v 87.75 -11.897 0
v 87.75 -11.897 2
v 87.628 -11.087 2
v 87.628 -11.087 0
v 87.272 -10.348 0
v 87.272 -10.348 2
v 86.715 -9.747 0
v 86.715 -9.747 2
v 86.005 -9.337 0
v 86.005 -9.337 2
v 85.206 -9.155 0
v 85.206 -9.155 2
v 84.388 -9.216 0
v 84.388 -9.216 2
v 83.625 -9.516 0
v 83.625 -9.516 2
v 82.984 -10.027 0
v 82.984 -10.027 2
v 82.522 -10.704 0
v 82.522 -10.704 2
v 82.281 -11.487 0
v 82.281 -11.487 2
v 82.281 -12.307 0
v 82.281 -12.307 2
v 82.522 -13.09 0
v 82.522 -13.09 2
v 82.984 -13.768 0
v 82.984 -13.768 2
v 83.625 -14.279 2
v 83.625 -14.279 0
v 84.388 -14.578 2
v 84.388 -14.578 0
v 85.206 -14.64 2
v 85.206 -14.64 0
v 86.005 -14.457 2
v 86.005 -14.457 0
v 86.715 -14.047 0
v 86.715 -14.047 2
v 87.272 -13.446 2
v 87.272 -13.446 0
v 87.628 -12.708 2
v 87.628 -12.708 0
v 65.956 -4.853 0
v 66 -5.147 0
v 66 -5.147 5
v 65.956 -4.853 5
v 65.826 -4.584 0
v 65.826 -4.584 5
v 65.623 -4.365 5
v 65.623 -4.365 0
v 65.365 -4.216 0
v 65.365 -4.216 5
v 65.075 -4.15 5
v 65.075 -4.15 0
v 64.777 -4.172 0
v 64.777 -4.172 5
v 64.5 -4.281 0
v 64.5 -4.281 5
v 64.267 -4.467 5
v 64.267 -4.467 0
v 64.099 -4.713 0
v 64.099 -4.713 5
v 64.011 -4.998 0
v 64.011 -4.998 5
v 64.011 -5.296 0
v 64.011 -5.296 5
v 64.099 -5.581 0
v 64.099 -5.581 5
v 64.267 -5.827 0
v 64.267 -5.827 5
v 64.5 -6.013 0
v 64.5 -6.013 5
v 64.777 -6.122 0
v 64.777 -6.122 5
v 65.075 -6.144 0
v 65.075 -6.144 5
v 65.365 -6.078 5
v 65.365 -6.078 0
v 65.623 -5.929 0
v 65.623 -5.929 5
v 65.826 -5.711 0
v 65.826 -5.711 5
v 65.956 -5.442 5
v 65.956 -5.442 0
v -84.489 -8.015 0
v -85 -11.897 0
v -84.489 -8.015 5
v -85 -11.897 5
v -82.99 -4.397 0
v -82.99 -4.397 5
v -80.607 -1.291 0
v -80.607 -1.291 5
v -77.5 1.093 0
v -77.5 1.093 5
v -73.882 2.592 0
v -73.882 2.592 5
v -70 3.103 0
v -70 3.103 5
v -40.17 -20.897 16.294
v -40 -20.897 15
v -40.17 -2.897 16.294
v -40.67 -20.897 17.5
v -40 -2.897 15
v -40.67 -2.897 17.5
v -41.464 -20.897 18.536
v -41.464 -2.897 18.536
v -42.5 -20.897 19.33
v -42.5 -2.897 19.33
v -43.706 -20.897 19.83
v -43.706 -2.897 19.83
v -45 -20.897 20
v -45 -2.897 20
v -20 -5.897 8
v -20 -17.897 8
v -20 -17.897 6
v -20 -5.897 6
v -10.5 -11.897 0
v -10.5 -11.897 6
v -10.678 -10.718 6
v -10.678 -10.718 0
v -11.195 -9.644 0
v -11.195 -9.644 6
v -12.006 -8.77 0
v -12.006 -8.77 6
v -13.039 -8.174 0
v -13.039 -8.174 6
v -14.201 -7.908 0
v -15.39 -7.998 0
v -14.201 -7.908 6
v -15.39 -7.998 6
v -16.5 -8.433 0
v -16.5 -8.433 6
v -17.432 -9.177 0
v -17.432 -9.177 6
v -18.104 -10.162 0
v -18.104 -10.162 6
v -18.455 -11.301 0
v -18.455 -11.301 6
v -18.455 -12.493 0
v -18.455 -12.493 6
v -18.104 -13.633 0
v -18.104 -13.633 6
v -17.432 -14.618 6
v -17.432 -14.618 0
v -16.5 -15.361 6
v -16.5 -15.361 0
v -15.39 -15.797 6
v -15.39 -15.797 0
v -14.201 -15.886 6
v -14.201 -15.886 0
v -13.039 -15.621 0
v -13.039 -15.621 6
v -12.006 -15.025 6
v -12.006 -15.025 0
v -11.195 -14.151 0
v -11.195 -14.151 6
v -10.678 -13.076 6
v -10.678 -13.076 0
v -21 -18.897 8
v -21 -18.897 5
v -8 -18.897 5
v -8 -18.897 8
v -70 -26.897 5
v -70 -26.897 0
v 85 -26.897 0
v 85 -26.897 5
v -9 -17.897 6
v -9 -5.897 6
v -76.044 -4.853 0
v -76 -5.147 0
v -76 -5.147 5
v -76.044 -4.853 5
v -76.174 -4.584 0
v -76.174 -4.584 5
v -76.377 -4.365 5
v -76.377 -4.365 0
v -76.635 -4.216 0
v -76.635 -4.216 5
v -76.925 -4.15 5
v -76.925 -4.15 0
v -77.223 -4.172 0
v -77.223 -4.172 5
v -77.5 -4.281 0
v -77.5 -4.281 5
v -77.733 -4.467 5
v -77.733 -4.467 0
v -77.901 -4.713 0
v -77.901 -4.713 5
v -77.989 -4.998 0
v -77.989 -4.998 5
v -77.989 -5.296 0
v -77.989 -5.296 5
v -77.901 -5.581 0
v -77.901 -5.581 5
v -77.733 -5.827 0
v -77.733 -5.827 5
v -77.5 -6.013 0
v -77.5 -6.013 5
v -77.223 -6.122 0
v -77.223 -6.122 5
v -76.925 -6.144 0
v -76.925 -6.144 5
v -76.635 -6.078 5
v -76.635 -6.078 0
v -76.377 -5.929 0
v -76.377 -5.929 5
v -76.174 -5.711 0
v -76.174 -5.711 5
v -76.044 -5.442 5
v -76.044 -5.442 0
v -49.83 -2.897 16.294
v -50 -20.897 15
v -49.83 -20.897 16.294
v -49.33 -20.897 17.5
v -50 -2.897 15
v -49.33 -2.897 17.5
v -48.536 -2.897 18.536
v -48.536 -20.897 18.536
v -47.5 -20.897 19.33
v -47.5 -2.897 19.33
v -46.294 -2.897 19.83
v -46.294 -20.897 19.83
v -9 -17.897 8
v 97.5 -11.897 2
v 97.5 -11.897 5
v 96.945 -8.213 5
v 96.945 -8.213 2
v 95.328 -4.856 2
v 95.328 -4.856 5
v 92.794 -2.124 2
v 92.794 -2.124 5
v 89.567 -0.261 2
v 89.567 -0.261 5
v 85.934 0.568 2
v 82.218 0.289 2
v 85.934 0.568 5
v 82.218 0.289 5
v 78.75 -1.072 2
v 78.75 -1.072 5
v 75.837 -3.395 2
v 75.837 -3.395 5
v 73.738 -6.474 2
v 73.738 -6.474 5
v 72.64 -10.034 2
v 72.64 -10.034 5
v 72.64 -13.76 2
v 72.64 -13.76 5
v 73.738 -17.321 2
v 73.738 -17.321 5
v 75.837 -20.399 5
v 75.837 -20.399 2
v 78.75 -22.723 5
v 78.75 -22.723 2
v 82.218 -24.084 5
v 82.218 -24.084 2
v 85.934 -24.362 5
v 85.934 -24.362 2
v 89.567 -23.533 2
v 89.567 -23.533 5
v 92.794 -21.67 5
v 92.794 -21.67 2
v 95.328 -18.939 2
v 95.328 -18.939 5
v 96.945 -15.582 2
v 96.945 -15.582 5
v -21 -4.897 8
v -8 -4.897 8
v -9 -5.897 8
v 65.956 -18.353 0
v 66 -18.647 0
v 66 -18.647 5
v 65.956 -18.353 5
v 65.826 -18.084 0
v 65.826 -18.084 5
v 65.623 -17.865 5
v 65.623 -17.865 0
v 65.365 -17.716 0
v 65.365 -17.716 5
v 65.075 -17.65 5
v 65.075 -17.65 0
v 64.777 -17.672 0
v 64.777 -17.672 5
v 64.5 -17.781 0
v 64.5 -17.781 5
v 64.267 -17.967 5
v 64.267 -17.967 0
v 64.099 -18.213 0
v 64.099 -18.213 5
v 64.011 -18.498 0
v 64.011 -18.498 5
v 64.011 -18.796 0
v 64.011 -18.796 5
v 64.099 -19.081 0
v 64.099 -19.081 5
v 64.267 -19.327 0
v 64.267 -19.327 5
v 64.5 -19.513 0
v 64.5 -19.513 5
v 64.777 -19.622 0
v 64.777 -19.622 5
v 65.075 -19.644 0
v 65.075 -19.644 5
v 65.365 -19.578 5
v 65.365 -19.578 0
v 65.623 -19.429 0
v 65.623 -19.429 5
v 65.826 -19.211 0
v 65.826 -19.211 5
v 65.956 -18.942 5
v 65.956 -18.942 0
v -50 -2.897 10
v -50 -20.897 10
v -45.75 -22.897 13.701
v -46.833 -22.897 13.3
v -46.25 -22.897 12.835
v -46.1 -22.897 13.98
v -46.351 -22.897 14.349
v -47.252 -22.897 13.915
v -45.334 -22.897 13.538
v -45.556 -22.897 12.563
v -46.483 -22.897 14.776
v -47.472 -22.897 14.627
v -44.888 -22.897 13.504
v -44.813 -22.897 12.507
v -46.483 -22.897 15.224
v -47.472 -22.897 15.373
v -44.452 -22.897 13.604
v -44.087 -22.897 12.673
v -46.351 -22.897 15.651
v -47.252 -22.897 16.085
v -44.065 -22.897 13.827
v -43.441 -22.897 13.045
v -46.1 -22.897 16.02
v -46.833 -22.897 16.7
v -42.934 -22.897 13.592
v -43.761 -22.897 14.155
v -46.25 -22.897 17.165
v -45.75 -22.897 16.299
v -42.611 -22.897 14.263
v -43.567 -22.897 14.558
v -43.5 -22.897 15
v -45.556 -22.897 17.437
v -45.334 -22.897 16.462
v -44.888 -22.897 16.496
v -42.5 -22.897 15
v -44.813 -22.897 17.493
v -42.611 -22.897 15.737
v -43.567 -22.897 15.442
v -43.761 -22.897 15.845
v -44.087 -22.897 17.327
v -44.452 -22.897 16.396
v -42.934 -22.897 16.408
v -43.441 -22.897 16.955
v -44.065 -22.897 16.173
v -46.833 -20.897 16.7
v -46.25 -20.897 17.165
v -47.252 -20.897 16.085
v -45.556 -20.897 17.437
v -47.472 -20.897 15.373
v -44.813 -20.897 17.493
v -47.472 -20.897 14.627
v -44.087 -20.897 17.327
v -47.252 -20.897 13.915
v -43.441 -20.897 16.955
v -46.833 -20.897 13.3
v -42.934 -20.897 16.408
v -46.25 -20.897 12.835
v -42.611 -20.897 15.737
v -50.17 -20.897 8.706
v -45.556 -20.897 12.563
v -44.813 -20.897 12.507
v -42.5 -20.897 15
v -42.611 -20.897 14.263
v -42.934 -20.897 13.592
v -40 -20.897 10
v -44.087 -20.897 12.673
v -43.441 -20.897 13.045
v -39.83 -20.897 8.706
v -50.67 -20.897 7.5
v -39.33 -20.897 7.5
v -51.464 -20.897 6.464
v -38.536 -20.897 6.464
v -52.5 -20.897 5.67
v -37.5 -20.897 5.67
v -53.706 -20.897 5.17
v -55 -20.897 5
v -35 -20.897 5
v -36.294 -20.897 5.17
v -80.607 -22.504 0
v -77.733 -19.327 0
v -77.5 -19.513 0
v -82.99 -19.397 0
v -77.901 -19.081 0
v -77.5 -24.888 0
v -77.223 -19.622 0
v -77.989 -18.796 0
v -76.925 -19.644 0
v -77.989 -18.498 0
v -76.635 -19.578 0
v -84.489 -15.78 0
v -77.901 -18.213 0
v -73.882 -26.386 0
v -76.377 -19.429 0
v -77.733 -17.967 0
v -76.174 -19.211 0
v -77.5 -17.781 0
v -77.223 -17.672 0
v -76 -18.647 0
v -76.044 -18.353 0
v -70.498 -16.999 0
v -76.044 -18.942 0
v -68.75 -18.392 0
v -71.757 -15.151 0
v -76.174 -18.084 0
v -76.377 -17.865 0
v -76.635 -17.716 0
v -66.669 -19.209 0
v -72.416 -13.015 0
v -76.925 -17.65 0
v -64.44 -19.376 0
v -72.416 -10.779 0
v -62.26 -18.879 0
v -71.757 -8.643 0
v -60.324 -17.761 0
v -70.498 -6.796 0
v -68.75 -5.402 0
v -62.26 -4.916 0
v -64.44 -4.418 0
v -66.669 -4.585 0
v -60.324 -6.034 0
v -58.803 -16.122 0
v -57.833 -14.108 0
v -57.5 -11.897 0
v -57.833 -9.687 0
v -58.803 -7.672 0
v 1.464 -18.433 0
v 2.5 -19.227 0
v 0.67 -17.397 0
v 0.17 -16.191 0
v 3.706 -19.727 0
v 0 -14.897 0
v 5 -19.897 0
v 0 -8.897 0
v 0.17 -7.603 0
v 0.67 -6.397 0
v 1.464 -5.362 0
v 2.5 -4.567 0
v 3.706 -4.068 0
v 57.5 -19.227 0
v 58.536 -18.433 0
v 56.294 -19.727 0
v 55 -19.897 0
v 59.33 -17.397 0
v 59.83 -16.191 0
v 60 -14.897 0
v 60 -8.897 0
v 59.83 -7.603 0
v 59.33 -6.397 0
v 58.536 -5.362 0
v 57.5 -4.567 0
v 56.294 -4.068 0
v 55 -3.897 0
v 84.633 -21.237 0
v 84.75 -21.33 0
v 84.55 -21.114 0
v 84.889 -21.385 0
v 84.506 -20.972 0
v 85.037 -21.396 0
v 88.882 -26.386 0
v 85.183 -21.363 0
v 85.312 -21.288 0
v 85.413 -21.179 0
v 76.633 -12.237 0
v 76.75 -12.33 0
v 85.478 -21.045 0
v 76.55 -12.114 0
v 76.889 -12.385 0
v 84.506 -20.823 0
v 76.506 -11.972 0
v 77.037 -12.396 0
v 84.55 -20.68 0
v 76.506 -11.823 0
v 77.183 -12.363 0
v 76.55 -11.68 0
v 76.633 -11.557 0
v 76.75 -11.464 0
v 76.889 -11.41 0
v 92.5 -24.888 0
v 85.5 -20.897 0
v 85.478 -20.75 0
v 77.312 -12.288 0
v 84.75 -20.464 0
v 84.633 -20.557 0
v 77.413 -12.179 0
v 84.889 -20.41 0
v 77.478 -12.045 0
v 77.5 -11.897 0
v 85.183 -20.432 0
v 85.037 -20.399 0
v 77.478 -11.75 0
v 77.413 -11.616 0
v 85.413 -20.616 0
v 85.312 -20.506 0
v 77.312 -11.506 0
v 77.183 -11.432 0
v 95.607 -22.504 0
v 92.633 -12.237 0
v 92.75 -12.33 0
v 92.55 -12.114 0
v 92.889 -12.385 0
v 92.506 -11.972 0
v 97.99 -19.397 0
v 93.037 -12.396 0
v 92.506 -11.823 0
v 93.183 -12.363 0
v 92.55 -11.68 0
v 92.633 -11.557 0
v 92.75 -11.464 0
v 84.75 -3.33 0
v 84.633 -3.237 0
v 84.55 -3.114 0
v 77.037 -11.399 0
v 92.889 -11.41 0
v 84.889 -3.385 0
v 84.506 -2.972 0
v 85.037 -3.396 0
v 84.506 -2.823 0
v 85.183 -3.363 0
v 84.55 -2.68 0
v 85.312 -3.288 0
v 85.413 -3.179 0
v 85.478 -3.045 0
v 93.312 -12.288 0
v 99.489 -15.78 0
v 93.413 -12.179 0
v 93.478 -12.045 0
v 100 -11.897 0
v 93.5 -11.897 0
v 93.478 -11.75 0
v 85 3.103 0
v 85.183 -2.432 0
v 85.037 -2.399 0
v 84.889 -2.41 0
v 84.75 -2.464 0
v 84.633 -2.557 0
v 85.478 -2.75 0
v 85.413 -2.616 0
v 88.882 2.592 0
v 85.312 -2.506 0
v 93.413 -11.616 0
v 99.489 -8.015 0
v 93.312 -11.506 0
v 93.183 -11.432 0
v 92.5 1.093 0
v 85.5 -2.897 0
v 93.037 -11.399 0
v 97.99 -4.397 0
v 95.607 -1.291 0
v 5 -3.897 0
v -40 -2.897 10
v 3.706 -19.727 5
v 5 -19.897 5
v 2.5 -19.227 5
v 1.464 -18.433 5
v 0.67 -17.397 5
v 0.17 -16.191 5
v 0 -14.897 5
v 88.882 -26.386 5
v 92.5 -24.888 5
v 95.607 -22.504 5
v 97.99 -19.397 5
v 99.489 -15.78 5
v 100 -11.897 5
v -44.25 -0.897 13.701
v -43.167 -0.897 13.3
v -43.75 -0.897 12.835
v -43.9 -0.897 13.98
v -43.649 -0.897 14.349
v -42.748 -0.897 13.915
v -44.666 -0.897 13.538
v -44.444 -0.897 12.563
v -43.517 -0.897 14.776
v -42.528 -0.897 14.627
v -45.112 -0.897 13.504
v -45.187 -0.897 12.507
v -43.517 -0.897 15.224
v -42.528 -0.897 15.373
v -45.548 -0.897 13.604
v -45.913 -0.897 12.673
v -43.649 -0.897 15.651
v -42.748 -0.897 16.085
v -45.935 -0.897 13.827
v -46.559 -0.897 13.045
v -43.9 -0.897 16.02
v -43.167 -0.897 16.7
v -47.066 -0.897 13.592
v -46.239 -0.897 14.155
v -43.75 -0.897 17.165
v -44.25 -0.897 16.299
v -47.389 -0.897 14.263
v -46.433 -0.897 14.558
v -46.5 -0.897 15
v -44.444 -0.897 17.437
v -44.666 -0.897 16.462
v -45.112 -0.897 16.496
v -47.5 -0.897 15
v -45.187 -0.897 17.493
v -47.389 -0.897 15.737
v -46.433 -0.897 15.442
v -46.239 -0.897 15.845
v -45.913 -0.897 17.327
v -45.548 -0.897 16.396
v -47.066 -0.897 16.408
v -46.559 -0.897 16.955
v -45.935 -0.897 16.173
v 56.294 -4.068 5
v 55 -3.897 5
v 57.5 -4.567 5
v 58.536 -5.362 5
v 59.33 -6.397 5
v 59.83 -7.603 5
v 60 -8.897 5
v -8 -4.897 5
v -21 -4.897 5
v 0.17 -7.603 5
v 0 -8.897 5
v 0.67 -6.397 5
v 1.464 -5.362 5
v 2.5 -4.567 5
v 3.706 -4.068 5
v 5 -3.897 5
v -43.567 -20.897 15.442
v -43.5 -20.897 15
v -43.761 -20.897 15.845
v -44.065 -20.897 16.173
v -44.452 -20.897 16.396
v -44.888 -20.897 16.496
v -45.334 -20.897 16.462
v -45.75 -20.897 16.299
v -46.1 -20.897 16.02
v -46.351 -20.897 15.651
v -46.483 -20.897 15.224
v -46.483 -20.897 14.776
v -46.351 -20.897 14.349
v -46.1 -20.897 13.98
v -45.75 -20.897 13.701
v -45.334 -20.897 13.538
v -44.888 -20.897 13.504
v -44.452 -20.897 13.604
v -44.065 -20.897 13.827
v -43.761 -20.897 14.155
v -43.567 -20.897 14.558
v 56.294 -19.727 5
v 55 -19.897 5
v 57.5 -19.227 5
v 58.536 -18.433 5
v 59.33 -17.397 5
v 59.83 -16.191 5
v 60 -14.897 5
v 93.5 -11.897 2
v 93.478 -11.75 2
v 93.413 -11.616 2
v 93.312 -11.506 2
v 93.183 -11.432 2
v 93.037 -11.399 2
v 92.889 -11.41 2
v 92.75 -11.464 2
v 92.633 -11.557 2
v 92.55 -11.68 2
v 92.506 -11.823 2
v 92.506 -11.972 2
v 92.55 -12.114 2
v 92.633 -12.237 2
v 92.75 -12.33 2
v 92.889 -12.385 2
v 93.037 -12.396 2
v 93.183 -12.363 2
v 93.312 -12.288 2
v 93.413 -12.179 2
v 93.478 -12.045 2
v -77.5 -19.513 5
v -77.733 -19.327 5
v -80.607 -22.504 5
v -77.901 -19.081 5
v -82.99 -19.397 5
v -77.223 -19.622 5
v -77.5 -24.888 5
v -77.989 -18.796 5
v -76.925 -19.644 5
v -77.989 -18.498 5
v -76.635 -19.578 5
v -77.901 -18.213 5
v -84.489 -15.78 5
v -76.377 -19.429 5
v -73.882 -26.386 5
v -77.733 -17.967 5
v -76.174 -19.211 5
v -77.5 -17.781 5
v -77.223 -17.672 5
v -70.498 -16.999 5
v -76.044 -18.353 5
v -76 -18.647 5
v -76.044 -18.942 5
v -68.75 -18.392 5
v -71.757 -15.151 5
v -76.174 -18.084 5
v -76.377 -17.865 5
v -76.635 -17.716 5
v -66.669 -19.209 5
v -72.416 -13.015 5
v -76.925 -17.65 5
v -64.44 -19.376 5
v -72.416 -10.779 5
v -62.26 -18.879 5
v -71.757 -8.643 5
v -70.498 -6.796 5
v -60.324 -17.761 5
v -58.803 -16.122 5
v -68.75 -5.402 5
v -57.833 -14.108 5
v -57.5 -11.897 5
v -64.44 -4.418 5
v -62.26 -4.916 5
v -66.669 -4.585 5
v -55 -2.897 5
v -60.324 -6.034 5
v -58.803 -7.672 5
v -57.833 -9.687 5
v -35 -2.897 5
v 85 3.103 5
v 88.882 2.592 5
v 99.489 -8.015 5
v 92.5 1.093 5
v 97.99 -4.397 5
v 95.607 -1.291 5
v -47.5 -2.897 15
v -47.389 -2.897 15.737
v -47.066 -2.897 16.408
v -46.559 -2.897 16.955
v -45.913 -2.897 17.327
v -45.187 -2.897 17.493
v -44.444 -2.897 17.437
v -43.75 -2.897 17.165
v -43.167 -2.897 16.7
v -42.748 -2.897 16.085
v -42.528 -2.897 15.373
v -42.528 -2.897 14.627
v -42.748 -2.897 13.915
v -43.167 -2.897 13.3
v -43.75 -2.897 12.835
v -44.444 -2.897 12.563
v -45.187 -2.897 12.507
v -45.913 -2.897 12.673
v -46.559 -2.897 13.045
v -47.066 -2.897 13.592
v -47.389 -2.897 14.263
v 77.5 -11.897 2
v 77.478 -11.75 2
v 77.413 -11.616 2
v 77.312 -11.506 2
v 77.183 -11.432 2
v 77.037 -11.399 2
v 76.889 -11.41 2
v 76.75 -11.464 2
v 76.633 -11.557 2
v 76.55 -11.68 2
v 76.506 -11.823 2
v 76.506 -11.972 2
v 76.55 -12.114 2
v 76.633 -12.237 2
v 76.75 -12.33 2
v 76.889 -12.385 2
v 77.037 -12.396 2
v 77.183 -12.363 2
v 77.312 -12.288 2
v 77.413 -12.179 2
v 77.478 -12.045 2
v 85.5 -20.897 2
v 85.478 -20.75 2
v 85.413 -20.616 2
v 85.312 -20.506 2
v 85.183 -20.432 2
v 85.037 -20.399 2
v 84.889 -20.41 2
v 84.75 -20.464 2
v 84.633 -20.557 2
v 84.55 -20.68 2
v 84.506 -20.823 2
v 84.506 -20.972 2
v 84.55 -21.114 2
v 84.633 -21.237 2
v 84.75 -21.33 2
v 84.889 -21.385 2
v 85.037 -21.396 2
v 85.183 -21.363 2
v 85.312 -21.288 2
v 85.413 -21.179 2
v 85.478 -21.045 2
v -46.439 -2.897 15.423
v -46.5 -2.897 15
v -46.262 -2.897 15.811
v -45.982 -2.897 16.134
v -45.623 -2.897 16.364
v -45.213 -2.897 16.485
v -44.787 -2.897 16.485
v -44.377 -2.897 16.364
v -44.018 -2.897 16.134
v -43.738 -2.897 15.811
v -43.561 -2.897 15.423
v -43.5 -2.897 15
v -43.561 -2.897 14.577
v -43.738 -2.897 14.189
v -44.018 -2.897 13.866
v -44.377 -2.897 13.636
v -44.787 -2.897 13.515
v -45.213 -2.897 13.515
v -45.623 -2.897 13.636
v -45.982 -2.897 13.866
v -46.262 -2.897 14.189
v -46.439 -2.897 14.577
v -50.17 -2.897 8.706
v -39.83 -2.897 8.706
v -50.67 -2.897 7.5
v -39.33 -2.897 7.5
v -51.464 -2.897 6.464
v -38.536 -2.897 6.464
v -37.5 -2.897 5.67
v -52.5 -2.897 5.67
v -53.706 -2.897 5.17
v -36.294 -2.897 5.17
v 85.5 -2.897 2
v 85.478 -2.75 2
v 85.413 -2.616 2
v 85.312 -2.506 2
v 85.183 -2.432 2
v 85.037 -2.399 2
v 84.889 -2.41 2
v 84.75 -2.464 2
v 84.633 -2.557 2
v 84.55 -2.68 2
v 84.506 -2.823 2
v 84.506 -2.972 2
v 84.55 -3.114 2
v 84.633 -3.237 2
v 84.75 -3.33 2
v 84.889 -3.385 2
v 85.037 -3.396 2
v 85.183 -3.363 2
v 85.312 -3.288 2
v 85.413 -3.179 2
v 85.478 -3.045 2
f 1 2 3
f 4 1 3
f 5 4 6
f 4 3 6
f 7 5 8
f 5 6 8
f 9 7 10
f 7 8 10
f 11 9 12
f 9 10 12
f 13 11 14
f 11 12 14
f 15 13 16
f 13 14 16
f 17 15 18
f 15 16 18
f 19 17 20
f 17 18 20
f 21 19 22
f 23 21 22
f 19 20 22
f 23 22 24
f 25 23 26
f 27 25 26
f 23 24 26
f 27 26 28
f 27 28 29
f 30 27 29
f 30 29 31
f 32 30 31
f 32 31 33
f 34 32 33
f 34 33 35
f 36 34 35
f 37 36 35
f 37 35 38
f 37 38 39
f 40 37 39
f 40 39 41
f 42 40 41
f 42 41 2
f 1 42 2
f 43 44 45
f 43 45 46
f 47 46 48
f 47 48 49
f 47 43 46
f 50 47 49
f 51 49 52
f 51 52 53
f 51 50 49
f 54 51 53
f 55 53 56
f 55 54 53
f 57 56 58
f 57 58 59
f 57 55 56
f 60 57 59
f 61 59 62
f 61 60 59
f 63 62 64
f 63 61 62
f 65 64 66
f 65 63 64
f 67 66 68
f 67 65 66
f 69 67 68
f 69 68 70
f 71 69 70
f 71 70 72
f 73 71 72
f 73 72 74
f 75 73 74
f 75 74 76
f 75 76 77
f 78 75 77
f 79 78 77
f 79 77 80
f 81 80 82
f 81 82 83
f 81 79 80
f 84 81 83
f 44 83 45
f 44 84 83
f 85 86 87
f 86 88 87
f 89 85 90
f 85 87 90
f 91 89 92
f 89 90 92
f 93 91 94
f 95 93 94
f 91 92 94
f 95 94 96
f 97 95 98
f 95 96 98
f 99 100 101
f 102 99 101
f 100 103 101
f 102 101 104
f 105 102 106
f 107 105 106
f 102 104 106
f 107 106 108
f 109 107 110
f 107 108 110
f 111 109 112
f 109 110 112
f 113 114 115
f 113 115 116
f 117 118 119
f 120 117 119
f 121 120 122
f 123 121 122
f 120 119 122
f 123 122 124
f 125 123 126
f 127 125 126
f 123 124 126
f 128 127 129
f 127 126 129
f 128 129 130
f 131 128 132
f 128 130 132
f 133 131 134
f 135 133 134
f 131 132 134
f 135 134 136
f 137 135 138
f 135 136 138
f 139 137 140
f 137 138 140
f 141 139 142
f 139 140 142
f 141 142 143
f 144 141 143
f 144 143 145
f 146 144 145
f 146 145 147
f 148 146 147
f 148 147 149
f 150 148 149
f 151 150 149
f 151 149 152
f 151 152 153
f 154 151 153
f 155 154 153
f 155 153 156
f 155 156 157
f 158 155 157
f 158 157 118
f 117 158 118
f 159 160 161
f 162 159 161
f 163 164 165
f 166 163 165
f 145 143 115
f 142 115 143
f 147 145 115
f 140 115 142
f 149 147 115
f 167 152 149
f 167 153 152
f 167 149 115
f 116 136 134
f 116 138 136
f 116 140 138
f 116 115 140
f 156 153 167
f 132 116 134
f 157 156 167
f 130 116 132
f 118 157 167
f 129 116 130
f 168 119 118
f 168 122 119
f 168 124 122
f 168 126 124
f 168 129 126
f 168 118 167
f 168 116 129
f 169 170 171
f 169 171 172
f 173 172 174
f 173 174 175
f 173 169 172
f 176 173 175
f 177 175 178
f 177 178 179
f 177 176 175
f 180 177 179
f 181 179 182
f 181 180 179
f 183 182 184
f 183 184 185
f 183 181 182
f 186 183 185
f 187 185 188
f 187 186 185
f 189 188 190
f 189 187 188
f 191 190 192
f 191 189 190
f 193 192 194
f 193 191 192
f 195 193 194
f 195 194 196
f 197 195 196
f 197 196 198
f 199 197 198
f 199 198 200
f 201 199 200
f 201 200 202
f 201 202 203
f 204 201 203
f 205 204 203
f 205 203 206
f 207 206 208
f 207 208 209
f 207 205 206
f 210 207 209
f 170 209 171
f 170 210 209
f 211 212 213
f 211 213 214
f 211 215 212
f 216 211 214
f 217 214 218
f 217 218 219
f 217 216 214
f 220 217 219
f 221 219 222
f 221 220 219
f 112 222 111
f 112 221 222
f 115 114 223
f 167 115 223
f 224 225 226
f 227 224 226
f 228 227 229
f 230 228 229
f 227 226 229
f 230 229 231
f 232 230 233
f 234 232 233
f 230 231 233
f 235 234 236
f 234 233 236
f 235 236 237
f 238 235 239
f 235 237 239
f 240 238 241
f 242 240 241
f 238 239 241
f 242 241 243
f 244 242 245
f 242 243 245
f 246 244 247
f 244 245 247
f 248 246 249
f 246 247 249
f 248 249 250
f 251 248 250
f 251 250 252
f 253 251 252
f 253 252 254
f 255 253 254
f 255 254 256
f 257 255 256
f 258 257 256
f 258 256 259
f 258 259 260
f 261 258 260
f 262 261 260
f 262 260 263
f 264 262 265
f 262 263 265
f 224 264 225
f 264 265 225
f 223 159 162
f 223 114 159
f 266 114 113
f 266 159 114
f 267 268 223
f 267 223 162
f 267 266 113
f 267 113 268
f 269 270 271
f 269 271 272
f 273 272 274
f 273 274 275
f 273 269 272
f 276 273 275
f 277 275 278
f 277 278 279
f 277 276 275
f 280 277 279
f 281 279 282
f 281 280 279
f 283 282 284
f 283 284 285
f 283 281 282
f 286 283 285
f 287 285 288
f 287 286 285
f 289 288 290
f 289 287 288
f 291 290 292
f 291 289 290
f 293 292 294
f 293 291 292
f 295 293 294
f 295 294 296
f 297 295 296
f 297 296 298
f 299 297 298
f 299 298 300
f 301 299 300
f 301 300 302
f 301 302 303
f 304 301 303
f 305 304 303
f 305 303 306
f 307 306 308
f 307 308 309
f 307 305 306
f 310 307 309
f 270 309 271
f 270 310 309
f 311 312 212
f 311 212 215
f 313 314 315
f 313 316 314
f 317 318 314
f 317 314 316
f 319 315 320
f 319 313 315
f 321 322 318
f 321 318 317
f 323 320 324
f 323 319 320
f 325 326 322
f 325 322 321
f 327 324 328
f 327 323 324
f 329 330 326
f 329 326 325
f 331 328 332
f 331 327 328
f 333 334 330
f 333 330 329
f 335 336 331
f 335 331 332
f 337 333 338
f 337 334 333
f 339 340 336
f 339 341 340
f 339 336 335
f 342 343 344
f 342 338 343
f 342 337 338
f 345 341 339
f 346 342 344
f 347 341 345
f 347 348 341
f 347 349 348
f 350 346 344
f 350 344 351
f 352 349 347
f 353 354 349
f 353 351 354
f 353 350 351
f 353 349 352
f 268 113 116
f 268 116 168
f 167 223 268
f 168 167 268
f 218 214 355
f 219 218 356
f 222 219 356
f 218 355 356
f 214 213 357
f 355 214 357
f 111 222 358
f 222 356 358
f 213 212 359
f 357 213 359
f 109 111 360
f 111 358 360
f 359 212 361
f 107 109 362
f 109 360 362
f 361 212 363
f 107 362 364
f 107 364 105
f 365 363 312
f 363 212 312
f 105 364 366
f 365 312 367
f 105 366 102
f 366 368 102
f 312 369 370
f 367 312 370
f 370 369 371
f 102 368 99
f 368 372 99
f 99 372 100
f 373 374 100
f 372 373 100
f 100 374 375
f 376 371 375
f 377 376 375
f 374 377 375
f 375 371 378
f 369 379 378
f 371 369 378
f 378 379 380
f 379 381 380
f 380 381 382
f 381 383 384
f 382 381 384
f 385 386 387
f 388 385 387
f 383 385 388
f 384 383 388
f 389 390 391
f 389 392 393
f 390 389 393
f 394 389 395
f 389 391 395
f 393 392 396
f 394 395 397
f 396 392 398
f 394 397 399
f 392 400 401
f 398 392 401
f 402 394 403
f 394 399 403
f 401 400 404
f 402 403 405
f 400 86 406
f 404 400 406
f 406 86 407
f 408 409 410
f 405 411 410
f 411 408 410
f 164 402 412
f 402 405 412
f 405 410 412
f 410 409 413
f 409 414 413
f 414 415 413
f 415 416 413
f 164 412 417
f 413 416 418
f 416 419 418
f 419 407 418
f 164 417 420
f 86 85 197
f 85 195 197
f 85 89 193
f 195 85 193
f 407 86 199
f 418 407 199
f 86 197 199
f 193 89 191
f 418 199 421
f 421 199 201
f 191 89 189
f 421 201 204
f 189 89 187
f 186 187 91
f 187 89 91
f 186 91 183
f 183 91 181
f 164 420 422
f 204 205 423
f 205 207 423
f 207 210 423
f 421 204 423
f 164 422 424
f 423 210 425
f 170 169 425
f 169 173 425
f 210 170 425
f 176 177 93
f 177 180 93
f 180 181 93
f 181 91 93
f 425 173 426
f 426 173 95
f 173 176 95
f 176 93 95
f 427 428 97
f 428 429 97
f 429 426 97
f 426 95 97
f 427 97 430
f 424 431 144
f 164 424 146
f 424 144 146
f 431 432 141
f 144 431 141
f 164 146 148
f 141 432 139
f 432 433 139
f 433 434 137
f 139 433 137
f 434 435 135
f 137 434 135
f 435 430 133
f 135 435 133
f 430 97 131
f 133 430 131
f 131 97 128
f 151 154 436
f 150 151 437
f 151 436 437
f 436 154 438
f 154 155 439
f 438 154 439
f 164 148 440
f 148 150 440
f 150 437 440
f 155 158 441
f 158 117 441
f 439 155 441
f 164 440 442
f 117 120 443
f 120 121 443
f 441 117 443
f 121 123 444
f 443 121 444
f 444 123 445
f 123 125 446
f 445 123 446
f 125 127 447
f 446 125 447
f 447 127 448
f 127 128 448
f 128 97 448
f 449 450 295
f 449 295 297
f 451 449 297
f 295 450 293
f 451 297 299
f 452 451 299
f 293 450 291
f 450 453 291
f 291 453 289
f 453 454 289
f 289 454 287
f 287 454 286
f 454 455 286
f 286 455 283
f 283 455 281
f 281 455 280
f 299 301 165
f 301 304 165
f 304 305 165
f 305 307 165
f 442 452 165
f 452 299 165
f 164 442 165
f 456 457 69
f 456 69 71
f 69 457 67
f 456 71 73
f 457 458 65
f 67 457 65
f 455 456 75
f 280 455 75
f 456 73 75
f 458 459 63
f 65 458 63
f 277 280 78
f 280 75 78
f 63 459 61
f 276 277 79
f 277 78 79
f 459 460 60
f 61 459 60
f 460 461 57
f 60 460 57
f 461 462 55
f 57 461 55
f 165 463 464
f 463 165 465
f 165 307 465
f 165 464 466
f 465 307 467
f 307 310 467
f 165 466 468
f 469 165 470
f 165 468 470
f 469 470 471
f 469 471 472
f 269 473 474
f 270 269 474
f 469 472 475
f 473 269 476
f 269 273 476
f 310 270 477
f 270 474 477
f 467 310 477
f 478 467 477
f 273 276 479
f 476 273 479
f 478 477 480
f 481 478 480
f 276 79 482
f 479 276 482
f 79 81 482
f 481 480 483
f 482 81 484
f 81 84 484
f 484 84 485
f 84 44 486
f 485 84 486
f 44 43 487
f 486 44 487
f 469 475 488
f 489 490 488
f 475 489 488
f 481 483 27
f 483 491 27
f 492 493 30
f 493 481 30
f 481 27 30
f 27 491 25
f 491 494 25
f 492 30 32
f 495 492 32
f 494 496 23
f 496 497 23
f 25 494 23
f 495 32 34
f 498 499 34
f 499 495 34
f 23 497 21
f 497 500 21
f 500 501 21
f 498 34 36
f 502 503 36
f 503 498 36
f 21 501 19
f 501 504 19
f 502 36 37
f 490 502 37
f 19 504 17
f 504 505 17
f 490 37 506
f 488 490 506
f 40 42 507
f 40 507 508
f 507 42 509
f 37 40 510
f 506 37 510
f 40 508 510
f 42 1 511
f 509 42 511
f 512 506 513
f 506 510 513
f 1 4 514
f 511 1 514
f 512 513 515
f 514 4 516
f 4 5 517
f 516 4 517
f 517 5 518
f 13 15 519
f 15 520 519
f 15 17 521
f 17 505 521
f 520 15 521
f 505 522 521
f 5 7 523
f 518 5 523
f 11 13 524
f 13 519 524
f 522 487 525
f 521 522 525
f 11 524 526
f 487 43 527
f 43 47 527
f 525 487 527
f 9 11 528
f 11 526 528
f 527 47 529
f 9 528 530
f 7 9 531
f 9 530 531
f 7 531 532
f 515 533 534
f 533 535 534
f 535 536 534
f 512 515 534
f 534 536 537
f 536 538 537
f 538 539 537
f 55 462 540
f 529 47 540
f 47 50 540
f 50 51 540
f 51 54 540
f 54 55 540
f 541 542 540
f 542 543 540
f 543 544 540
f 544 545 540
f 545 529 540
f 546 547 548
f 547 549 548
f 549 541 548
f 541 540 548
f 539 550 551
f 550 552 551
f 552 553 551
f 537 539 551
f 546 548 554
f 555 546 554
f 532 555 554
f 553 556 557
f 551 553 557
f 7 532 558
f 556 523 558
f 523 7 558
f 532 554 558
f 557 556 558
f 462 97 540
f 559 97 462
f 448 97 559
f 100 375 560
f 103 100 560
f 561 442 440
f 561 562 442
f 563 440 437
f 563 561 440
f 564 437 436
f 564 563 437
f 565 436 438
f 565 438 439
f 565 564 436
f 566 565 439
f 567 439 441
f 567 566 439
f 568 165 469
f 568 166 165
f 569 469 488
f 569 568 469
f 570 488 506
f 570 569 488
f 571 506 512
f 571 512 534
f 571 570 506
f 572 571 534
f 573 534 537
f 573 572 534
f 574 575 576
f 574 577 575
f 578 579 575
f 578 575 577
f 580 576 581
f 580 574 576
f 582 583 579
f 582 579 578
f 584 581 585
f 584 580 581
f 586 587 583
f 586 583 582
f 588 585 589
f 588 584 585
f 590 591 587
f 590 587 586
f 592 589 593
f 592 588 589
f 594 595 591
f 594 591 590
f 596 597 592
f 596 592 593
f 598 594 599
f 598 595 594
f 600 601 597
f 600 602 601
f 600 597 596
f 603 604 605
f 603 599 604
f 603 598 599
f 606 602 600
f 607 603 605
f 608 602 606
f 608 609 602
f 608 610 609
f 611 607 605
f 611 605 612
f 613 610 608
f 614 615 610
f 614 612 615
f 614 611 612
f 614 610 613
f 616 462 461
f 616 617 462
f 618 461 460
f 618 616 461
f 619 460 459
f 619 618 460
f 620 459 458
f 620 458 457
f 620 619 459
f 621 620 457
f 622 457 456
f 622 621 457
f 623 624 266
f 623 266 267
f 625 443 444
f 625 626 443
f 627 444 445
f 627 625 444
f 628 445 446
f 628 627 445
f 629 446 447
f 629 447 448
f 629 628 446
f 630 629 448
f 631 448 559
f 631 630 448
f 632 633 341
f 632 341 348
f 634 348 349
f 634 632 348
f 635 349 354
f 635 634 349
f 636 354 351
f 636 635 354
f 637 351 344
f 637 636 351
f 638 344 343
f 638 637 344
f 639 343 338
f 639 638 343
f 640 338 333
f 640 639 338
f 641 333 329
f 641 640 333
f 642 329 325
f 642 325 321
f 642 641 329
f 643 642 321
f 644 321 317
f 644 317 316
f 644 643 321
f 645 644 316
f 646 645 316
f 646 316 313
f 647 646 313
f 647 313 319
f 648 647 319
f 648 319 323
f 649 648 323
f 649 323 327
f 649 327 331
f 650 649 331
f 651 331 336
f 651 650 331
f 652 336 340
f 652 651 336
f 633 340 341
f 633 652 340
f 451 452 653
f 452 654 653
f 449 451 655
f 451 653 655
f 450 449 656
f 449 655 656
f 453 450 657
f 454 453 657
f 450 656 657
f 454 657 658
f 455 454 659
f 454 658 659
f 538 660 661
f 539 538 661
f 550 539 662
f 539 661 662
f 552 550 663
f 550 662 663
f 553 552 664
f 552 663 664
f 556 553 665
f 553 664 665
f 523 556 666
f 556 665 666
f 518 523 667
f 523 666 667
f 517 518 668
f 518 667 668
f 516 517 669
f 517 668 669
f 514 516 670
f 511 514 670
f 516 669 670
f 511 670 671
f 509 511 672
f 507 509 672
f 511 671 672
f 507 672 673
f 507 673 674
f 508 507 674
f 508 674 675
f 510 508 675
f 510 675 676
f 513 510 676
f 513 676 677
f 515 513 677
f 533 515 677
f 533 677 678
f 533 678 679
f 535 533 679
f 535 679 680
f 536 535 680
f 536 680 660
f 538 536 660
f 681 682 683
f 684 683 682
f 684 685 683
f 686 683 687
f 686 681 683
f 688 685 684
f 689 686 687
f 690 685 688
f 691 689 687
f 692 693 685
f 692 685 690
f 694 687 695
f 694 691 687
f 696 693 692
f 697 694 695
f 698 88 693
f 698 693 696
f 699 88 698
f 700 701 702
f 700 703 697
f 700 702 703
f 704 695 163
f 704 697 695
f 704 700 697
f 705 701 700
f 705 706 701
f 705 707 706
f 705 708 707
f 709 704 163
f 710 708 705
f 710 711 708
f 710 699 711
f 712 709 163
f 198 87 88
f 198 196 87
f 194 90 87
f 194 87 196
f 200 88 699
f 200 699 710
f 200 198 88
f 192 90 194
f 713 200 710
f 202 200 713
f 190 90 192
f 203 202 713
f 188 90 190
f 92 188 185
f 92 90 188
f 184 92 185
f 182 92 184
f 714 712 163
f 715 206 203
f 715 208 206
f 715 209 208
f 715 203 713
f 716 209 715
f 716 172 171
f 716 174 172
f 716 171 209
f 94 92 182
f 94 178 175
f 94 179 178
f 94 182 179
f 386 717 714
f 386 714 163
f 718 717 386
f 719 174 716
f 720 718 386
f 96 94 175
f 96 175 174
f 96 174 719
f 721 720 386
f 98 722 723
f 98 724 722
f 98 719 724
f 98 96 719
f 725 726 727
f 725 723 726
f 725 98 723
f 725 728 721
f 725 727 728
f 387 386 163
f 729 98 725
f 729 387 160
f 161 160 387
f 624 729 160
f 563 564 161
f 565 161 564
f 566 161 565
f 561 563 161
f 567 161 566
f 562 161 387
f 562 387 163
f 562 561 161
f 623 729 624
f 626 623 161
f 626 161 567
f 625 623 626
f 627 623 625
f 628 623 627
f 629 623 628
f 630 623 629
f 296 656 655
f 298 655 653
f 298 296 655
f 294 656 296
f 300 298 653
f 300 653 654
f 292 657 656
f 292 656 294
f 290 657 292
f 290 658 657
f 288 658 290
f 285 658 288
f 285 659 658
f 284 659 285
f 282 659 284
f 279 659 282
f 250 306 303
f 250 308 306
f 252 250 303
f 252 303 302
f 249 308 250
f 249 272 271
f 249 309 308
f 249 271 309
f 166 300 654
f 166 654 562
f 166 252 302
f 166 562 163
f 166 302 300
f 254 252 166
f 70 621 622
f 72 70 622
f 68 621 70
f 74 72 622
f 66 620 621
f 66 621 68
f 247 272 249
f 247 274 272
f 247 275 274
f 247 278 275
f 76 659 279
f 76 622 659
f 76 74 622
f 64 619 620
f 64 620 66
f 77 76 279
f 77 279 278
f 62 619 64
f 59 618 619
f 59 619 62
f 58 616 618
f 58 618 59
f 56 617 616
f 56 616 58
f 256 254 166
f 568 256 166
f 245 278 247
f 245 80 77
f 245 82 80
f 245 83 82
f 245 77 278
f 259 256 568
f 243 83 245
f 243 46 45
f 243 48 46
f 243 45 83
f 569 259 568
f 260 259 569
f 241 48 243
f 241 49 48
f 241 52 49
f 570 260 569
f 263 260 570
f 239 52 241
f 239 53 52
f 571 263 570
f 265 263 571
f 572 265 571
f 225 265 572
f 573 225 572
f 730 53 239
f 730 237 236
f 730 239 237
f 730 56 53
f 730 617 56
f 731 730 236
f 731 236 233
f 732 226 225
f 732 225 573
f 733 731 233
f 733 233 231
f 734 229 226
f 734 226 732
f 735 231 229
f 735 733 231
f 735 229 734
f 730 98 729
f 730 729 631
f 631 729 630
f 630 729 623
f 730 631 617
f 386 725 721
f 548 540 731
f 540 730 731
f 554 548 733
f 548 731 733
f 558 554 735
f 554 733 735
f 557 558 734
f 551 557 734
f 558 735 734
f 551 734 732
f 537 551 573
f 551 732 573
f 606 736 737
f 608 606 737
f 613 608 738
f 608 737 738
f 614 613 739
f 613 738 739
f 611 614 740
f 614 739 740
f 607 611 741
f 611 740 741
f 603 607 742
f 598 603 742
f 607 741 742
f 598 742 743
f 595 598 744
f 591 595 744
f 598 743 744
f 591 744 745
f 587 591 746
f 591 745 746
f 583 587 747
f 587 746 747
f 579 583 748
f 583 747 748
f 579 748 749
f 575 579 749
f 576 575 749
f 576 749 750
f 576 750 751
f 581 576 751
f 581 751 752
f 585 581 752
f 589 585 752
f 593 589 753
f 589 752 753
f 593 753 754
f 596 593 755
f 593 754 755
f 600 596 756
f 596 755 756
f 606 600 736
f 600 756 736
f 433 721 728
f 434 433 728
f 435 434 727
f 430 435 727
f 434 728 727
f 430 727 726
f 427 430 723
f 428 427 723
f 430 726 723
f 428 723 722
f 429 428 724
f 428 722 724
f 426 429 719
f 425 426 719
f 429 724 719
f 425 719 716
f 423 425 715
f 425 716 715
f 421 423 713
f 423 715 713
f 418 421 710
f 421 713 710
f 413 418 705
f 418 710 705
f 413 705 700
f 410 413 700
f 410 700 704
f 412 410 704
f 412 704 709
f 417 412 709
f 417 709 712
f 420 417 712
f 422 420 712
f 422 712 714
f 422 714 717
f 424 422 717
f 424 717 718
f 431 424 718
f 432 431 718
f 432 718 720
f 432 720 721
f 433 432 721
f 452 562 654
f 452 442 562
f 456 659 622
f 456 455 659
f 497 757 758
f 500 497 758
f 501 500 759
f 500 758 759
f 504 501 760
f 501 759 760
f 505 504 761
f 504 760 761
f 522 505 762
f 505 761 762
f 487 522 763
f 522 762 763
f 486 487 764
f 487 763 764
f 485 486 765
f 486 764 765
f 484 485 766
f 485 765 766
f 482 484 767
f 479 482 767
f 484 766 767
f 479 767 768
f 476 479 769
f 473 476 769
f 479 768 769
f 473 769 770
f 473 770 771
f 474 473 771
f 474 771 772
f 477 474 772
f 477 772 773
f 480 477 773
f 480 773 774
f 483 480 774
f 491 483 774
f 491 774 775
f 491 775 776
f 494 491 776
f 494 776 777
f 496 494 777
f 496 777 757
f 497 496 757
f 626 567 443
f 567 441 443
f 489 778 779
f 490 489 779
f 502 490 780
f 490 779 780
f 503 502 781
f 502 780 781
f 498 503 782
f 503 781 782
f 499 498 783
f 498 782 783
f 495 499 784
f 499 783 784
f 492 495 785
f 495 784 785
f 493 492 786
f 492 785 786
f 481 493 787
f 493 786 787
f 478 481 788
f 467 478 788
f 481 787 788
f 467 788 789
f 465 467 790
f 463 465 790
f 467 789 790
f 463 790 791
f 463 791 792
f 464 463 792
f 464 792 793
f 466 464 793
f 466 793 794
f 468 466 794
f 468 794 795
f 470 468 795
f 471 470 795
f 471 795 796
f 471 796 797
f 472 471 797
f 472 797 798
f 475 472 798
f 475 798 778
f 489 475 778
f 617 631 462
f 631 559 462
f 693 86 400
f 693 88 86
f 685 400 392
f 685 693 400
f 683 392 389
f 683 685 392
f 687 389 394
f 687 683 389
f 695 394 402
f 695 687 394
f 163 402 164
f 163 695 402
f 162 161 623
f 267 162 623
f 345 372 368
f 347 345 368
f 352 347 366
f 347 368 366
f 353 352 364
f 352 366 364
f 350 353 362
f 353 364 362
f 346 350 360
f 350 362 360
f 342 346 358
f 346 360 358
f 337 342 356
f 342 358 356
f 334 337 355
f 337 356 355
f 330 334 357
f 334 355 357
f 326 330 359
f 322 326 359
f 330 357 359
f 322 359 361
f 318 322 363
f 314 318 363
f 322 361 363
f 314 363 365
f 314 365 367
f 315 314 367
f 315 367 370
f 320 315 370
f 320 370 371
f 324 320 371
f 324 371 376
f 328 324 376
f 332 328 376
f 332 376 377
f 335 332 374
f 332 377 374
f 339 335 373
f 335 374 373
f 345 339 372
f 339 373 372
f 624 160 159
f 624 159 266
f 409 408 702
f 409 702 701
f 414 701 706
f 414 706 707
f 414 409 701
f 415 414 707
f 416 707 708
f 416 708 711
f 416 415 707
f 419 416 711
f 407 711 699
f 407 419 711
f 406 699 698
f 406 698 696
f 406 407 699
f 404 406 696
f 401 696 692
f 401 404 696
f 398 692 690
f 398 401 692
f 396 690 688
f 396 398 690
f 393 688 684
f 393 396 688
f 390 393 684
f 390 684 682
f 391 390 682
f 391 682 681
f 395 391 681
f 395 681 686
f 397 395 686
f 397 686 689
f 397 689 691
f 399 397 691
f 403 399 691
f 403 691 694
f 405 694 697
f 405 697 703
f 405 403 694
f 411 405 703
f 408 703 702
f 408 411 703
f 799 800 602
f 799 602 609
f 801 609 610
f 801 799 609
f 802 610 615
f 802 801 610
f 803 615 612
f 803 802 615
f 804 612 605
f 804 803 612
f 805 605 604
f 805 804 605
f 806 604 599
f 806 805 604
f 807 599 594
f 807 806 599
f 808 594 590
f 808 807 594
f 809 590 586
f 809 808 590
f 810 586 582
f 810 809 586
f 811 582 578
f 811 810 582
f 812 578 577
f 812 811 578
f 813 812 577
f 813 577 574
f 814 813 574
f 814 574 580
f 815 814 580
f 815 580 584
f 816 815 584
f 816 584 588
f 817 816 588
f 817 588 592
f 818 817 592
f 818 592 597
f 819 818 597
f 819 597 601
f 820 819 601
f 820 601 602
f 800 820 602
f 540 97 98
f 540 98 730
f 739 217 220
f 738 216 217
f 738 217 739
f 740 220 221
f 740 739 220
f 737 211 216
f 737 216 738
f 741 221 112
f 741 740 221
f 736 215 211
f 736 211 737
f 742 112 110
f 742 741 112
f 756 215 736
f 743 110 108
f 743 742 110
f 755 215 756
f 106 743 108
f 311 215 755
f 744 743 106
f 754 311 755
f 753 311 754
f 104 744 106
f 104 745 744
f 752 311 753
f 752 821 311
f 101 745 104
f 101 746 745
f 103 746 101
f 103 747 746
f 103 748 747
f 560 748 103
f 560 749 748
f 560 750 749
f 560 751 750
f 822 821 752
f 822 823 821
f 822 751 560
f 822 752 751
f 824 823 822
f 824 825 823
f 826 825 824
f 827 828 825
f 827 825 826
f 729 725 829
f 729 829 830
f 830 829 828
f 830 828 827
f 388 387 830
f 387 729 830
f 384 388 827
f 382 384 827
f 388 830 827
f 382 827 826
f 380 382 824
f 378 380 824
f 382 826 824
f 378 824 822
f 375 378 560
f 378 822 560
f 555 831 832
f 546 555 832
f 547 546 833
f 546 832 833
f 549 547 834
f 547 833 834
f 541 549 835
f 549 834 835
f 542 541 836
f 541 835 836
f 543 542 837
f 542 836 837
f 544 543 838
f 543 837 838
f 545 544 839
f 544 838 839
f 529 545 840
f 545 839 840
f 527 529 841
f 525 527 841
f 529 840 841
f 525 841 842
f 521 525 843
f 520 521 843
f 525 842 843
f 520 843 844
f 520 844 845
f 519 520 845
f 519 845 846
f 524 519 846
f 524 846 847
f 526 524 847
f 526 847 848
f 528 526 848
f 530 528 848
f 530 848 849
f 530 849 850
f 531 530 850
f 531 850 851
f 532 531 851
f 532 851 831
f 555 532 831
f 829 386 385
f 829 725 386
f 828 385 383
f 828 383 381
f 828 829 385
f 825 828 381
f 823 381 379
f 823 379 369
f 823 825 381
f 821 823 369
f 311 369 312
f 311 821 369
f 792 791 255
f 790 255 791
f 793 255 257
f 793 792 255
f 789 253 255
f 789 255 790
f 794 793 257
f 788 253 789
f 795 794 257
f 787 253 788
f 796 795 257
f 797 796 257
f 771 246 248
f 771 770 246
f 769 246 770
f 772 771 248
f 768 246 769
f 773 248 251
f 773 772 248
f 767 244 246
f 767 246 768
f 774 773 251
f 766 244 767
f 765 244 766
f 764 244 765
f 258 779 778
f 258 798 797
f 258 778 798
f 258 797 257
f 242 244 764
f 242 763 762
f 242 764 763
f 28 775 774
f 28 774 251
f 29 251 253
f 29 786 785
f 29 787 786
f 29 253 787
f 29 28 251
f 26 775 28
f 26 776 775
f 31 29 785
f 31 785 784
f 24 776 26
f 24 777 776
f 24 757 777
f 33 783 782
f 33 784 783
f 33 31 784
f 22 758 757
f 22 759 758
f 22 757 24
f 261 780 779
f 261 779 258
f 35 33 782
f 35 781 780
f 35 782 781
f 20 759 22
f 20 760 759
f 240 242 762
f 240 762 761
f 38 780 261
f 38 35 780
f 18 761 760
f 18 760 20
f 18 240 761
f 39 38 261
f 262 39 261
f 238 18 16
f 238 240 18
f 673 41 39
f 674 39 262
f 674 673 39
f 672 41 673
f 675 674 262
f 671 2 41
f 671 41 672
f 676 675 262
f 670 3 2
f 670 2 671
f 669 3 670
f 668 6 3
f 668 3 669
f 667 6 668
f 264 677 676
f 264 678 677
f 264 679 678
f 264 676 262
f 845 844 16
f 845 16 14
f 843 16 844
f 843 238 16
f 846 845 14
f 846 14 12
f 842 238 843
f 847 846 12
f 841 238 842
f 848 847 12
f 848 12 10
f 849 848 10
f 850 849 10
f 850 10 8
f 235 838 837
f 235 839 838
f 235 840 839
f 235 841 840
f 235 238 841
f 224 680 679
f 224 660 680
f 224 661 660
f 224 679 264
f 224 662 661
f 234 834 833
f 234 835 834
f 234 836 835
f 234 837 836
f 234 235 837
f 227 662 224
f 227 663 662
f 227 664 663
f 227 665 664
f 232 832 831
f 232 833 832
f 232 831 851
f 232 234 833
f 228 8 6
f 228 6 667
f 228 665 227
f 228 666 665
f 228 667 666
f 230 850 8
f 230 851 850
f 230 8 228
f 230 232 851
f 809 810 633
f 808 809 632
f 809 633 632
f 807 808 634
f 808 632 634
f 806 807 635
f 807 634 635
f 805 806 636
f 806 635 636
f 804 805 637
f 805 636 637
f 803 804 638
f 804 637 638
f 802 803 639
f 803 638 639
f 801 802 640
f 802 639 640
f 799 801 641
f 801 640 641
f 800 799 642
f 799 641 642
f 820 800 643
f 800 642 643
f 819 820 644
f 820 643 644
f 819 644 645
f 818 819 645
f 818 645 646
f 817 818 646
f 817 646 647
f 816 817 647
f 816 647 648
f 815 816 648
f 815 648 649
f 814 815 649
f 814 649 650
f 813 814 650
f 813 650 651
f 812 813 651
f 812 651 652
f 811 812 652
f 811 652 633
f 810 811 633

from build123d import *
from build123d import SkipClean  # not in build123d's __all__

# Parameters (mm, degrees)
F0_W      = 185
F0_H      = 30
F0_R      = 1
F0_W_2    = 60
F0_H_2    = 16
F1_DEPTH  = 5
F2_R      = 12.5
F2_R_2    = 0.5
F2_R_3    = 2.75
F3_DEPTH  = 3
F4_DEPTH  = 25
F5_R      = 14.99999
F2_R_4    = 7.5
F6_DEPTH  = 25
F2_W      = 10
F2_H      = 18
F7_DEPTH  = 15
F8_R      = 4.99999
F9_R      = 1.5
F10_DEPTH = 25
F9_R_2    = 2.5
F11_DEPTH = 2
F12_R     = 2.5
F12_R_2   = 1.5
F13_DEPTH = 2
F2_W_2    = 13
F2_H_2    = 14
F14_DEPTH = 3
F15_W     = 11
F15_H     = 12
F15_R     = 4
F16_DEPTH = 2
F17_DEPTH = 25
F18_R     = 5


# Not quite as in the source:
# - a fillet or chamfer is up to 0.001 mm smaller than in the source, because OpenCascade refuses the exact size
# - after a boolean that leaves OpenCascade's solid faulty, fix() repairs it


with BuildPart() as f1:
    # F0 (on Top) → F1 (new body)
    with BuildSketch(Plane.XY):
        with Locations((7.5, -11.8972941886)):
            Rectangle(F0_W, F0_H)
        with Locations((-77, -18.6472941886)):
            Circle(F0_R, mode=Mode.SUBTRACT)
        with Locations((30, -11.8972941886)):
            Rectangle(F0_W_2, F0_H_2, mode=Mode.SUBTRACT)
        with Locations((65, -18.6472941886)):
            Circle(F0_R, mode=Mode.SUBTRACT)
        with Locations((-77, -5.1472941886)):
            Circle(F0_R, mode=Mode.SUBTRACT)
        with Locations((65, -5.1472941886)):
            Circle(F0_R, mode=Mode.SUBTRACT)
    extrude(amount=F1_DEPTH)

    # F2 (on face) → F3 (cut)
    with BuildSketch(Plane.XY.offset(5)):
        with Locations((85, -11.8972941886)):
            Circle(F2_R)
        with Locations((85, -20.8972941886)):
            Circle(F2_R_2, mode=Mode.SUBTRACT)
        with Locations((85, -11.8972941886)):
            Circle(F2_R_3, mode=Mode.SUBTRACT)
        with Locations((77, -11.8972941886)):
            Circle(F2_R_2, mode=Mode.SUBTRACT)
        with Locations((93, -11.8972941886)):
            Circle(F2_R_2, mode=Mode.SUBTRACT)
        with Locations((85, -2.8972941886)):
            Circle(F2_R_2, mode=Mode.SUBTRACT)
    extrude(amount=-F3_DEPTH, mode=Mode.SUBTRACT)

    # F2 (on face) → F4 (cut)
    with BuildSketch(Plane.XY.offset(5)):
        with Locations((85, -11.8972941886)):
            Circle(F2_R_3)
        with Locations((85, -2.8972941886)):
            Circle(F2_R_2)
        with Locations((77, -11.8972941886)):
            Circle(F2_R_2)
        with Locations((85, -20.8972941886)):
            Circle(F2_R_2)
        with Locations((93, -11.8972941886)):
            Circle(F2_R_2)
    extrude(amount=-F4_DEPTH, mode=Mode.SUBTRACT)

    # F5 (radius 15 in the source; OpenCascade refuses exactly that, so slightly less here)
    f5_edges = [f1.edges().sort_by_distance(p)[0] for p in [
        (100, 3.102706, 2.5),
        (100, -26.897294, 2.5),
        (-85, -26.897294, 2.5),
        (-85, 3.102706, 2.5),
    ]]
    fillet(f5_edges, radius=F5_R)

    # F2 (on face) → F6 (cut)
    with BuildSketch(Plane.XY.offset(5)):
        with Locations((-65, -11.8972941886)):
            Circle(F2_R_4)
    extrude(amount=-F6_DEPTH, mode=Mode.SUBTRACT)

    # F2 (on face) → F7 (join)
    with BuildSketch(Plane.XY.offset(5)):
        with Locations((-45, -11.8972941886)):
            Rectangle(F2_W, F2_H)
    extrude(amount=F7_DEPTH)

    # F8 (radius 5 in the source; OpenCascade refuses exactly that, so slightly less here)
    f8_edges = [f1.edges().sort_by_distance(p)[0] for p in [
        (-50, -11.897294, 5),
        (-40, -11.897294, 20),
        (-50, -11.897294, 20),
        (-40, -11.897294, 5),
    ]]
    fillet(f8_edges, radius=F8_R)

    # F9 (on face) → F10 (cut)
    with BuildSketch(Plane.XZ.offset(20.8972941886)):
        with Locations((-45, 15)):
            Circle(F9_R)
    extrude(amount=-F10_DEPTH, mode=Mode.SUBTRACT)

    # F9 (on face) → F11 (join)
    with BuildSketch(Plane.XZ.offset(20.8972941886)):
        with Locations((-45, 15)):
            Circle(F9_R_2)
        with Locations((-45, 15)):
            Circle(F9_R, mode=Mode.SUBTRACT)
    extrude(amount=F11_DEPTH)

    # F12 (on face) → F13 (join)
    with BuildSketch(Plane(origin=(0, -2.8972941886, 0), x_dir=(-1, 0, 0), z_dir=(0, 1, 0))):
        with Locations((45, 15)):
            Circle(F12_R)
        with Locations((45, 15)):
            Circle(F12_R_2, mode=Mode.SUBTRACT)
    with SkipClean():  # cleaning this boolean's faces spoils the solid; the shape is the same uncleaned
        extrude(amount=F13_DEPTH)

    # F2 (on face) → F14 (join)
    with BuildSketch(Plane.XY.offset(5)):
        with Locations((-14.5, -11.8972941886)):
            Rectangle(F2_W_2, F2_H_2)
    extrude(amount=F14_DEPTH)

    add(f1.part.fix(), mode=Mode.REPLACE)

    # F15 (on face) → F16 (cut)
    with BuildSketch(Plane.XY.offset(8)):
        with Locations((-14.5, -11.8972941886)):
            Rectangle(F15_W, F15_H)
        with Locations((-14.5, -11.8972941886)):
            Circle(F15_R, mode=Mode.SUBTRACT)
    extrude(amount=-F16_DEPTH, mode=Mode.SUBTRACT)

    # F17 (cut): a face of the model
    f17_faces = [f1.faces().sort_by_distance(p)[0] for p in [
        (-14.5, -11.8972941886, 8),
    ]]
    extrude(f17_faces, amount=-F17_DEPTH, mode=Mode.SUBTRACT)

    # F18
    f18_edges = [f1.edges().sort_by_distance(p)[0] for p in [
        (0, -3.897294, 2.5),
        (0, -19.897294, 2.5),
        (60, -3.897294, 2.5),
        (60, -19.897294, 2.5),
    ]]
    fillet(f18_edges, radius=F18_R)


solid = f1.part
